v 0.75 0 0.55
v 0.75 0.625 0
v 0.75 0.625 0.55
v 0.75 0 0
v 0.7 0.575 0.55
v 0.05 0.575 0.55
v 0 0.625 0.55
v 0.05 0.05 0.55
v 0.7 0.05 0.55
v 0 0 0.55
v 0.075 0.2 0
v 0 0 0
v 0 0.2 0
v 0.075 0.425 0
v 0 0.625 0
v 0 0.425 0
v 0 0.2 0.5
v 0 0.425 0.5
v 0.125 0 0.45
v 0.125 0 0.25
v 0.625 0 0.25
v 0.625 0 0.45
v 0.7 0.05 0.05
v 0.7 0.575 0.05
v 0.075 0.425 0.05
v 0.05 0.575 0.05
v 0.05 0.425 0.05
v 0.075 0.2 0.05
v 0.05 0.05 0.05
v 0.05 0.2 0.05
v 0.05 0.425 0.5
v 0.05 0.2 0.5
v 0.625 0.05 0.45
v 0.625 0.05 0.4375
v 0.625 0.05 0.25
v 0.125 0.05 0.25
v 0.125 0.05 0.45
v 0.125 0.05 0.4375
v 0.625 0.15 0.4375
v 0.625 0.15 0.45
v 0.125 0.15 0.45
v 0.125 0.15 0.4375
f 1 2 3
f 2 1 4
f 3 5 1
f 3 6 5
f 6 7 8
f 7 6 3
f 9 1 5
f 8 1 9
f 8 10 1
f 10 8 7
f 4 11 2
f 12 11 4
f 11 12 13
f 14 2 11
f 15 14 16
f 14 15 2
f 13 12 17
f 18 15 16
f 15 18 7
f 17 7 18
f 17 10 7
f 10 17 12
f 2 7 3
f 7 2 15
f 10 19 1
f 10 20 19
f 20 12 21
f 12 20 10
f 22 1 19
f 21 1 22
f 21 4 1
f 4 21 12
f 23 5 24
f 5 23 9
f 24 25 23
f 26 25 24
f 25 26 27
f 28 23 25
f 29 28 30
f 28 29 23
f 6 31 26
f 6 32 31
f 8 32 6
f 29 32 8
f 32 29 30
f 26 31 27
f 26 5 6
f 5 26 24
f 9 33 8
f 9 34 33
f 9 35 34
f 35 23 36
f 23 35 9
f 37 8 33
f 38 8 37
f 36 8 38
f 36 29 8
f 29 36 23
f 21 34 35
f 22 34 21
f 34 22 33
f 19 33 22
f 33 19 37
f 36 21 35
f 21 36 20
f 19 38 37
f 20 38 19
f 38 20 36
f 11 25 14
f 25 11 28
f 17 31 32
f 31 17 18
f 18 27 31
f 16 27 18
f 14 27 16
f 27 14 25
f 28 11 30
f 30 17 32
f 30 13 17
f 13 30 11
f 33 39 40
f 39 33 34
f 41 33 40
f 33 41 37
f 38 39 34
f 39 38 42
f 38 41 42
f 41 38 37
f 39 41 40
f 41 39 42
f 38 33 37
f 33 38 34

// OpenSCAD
$fn = 100;

// Outer dimensions
outer_width  = 0.75;
outer_depth  = 0.625;
outer_height = 0.55;

// Shell construction parameters
wall_thickness = 0.05;
base_thickness = 0.05;

// Front horizontal cut parameters
front_cut_len   = 0.5;
front_cut_z_min = 0.25;
front_cut_z_max = 0.45;
front_cut_depth = 0.075;

// Left side vertical opening parameters
side_open_depth        = 0.075;
side_open_len          = 0.225;
side_open_z_max        = 0.50;
side_open_front_margin = 0.20;

// Internal front ledge parameters
ledge_len   = 0.5;
ledge_width = 0.10;
ledge_thick = 0.0125;
ledge_z_pos = front_cut_z_max - ledge_thick;

// Main reusable module
module parametric_enclosure() {
    union() {
        // Create open-top hollow shell by subtracting inner void
        difference() {
            // Outer solid footprint
            cube([outer_width, outer_depth, outer_height]);

            // Inner rectangular void
            translate([wall_thickness, wall_thickness, base_thickness])
                cube([
                    outer_width  - 2 * wall_thickness,
                    outer_depth  - 2 * wall_thickness,
                    outer_height - base_thickness
                ]);

            // Remove front horizontal wall cut
            translate([
                (outer_width - front_cut_len) / 2,
                0,
                front_cut_z_min
            ])
            cube([
                front_cut_len,
                front_cut_depth,
                front_cut_z_max - front_cut_z_min
            ]);

            // Remove left side vertical opening
            translate([
                0,
                side_open_front_margin,
                0
            ])
            cube([
                side_open_depth,
                side_open_len,
                side_open_z_max
            ]);
        }

        // Add internal front ledge solid
        translate([
            (outer_width - ledge_len) / 2,
            wall_thickness,
            ledge_z_pos
        ])
        cube([ledge_len, ledge_width, ledge_thick]);
    }
}

// Instantiate model
parametric_enclosure();
